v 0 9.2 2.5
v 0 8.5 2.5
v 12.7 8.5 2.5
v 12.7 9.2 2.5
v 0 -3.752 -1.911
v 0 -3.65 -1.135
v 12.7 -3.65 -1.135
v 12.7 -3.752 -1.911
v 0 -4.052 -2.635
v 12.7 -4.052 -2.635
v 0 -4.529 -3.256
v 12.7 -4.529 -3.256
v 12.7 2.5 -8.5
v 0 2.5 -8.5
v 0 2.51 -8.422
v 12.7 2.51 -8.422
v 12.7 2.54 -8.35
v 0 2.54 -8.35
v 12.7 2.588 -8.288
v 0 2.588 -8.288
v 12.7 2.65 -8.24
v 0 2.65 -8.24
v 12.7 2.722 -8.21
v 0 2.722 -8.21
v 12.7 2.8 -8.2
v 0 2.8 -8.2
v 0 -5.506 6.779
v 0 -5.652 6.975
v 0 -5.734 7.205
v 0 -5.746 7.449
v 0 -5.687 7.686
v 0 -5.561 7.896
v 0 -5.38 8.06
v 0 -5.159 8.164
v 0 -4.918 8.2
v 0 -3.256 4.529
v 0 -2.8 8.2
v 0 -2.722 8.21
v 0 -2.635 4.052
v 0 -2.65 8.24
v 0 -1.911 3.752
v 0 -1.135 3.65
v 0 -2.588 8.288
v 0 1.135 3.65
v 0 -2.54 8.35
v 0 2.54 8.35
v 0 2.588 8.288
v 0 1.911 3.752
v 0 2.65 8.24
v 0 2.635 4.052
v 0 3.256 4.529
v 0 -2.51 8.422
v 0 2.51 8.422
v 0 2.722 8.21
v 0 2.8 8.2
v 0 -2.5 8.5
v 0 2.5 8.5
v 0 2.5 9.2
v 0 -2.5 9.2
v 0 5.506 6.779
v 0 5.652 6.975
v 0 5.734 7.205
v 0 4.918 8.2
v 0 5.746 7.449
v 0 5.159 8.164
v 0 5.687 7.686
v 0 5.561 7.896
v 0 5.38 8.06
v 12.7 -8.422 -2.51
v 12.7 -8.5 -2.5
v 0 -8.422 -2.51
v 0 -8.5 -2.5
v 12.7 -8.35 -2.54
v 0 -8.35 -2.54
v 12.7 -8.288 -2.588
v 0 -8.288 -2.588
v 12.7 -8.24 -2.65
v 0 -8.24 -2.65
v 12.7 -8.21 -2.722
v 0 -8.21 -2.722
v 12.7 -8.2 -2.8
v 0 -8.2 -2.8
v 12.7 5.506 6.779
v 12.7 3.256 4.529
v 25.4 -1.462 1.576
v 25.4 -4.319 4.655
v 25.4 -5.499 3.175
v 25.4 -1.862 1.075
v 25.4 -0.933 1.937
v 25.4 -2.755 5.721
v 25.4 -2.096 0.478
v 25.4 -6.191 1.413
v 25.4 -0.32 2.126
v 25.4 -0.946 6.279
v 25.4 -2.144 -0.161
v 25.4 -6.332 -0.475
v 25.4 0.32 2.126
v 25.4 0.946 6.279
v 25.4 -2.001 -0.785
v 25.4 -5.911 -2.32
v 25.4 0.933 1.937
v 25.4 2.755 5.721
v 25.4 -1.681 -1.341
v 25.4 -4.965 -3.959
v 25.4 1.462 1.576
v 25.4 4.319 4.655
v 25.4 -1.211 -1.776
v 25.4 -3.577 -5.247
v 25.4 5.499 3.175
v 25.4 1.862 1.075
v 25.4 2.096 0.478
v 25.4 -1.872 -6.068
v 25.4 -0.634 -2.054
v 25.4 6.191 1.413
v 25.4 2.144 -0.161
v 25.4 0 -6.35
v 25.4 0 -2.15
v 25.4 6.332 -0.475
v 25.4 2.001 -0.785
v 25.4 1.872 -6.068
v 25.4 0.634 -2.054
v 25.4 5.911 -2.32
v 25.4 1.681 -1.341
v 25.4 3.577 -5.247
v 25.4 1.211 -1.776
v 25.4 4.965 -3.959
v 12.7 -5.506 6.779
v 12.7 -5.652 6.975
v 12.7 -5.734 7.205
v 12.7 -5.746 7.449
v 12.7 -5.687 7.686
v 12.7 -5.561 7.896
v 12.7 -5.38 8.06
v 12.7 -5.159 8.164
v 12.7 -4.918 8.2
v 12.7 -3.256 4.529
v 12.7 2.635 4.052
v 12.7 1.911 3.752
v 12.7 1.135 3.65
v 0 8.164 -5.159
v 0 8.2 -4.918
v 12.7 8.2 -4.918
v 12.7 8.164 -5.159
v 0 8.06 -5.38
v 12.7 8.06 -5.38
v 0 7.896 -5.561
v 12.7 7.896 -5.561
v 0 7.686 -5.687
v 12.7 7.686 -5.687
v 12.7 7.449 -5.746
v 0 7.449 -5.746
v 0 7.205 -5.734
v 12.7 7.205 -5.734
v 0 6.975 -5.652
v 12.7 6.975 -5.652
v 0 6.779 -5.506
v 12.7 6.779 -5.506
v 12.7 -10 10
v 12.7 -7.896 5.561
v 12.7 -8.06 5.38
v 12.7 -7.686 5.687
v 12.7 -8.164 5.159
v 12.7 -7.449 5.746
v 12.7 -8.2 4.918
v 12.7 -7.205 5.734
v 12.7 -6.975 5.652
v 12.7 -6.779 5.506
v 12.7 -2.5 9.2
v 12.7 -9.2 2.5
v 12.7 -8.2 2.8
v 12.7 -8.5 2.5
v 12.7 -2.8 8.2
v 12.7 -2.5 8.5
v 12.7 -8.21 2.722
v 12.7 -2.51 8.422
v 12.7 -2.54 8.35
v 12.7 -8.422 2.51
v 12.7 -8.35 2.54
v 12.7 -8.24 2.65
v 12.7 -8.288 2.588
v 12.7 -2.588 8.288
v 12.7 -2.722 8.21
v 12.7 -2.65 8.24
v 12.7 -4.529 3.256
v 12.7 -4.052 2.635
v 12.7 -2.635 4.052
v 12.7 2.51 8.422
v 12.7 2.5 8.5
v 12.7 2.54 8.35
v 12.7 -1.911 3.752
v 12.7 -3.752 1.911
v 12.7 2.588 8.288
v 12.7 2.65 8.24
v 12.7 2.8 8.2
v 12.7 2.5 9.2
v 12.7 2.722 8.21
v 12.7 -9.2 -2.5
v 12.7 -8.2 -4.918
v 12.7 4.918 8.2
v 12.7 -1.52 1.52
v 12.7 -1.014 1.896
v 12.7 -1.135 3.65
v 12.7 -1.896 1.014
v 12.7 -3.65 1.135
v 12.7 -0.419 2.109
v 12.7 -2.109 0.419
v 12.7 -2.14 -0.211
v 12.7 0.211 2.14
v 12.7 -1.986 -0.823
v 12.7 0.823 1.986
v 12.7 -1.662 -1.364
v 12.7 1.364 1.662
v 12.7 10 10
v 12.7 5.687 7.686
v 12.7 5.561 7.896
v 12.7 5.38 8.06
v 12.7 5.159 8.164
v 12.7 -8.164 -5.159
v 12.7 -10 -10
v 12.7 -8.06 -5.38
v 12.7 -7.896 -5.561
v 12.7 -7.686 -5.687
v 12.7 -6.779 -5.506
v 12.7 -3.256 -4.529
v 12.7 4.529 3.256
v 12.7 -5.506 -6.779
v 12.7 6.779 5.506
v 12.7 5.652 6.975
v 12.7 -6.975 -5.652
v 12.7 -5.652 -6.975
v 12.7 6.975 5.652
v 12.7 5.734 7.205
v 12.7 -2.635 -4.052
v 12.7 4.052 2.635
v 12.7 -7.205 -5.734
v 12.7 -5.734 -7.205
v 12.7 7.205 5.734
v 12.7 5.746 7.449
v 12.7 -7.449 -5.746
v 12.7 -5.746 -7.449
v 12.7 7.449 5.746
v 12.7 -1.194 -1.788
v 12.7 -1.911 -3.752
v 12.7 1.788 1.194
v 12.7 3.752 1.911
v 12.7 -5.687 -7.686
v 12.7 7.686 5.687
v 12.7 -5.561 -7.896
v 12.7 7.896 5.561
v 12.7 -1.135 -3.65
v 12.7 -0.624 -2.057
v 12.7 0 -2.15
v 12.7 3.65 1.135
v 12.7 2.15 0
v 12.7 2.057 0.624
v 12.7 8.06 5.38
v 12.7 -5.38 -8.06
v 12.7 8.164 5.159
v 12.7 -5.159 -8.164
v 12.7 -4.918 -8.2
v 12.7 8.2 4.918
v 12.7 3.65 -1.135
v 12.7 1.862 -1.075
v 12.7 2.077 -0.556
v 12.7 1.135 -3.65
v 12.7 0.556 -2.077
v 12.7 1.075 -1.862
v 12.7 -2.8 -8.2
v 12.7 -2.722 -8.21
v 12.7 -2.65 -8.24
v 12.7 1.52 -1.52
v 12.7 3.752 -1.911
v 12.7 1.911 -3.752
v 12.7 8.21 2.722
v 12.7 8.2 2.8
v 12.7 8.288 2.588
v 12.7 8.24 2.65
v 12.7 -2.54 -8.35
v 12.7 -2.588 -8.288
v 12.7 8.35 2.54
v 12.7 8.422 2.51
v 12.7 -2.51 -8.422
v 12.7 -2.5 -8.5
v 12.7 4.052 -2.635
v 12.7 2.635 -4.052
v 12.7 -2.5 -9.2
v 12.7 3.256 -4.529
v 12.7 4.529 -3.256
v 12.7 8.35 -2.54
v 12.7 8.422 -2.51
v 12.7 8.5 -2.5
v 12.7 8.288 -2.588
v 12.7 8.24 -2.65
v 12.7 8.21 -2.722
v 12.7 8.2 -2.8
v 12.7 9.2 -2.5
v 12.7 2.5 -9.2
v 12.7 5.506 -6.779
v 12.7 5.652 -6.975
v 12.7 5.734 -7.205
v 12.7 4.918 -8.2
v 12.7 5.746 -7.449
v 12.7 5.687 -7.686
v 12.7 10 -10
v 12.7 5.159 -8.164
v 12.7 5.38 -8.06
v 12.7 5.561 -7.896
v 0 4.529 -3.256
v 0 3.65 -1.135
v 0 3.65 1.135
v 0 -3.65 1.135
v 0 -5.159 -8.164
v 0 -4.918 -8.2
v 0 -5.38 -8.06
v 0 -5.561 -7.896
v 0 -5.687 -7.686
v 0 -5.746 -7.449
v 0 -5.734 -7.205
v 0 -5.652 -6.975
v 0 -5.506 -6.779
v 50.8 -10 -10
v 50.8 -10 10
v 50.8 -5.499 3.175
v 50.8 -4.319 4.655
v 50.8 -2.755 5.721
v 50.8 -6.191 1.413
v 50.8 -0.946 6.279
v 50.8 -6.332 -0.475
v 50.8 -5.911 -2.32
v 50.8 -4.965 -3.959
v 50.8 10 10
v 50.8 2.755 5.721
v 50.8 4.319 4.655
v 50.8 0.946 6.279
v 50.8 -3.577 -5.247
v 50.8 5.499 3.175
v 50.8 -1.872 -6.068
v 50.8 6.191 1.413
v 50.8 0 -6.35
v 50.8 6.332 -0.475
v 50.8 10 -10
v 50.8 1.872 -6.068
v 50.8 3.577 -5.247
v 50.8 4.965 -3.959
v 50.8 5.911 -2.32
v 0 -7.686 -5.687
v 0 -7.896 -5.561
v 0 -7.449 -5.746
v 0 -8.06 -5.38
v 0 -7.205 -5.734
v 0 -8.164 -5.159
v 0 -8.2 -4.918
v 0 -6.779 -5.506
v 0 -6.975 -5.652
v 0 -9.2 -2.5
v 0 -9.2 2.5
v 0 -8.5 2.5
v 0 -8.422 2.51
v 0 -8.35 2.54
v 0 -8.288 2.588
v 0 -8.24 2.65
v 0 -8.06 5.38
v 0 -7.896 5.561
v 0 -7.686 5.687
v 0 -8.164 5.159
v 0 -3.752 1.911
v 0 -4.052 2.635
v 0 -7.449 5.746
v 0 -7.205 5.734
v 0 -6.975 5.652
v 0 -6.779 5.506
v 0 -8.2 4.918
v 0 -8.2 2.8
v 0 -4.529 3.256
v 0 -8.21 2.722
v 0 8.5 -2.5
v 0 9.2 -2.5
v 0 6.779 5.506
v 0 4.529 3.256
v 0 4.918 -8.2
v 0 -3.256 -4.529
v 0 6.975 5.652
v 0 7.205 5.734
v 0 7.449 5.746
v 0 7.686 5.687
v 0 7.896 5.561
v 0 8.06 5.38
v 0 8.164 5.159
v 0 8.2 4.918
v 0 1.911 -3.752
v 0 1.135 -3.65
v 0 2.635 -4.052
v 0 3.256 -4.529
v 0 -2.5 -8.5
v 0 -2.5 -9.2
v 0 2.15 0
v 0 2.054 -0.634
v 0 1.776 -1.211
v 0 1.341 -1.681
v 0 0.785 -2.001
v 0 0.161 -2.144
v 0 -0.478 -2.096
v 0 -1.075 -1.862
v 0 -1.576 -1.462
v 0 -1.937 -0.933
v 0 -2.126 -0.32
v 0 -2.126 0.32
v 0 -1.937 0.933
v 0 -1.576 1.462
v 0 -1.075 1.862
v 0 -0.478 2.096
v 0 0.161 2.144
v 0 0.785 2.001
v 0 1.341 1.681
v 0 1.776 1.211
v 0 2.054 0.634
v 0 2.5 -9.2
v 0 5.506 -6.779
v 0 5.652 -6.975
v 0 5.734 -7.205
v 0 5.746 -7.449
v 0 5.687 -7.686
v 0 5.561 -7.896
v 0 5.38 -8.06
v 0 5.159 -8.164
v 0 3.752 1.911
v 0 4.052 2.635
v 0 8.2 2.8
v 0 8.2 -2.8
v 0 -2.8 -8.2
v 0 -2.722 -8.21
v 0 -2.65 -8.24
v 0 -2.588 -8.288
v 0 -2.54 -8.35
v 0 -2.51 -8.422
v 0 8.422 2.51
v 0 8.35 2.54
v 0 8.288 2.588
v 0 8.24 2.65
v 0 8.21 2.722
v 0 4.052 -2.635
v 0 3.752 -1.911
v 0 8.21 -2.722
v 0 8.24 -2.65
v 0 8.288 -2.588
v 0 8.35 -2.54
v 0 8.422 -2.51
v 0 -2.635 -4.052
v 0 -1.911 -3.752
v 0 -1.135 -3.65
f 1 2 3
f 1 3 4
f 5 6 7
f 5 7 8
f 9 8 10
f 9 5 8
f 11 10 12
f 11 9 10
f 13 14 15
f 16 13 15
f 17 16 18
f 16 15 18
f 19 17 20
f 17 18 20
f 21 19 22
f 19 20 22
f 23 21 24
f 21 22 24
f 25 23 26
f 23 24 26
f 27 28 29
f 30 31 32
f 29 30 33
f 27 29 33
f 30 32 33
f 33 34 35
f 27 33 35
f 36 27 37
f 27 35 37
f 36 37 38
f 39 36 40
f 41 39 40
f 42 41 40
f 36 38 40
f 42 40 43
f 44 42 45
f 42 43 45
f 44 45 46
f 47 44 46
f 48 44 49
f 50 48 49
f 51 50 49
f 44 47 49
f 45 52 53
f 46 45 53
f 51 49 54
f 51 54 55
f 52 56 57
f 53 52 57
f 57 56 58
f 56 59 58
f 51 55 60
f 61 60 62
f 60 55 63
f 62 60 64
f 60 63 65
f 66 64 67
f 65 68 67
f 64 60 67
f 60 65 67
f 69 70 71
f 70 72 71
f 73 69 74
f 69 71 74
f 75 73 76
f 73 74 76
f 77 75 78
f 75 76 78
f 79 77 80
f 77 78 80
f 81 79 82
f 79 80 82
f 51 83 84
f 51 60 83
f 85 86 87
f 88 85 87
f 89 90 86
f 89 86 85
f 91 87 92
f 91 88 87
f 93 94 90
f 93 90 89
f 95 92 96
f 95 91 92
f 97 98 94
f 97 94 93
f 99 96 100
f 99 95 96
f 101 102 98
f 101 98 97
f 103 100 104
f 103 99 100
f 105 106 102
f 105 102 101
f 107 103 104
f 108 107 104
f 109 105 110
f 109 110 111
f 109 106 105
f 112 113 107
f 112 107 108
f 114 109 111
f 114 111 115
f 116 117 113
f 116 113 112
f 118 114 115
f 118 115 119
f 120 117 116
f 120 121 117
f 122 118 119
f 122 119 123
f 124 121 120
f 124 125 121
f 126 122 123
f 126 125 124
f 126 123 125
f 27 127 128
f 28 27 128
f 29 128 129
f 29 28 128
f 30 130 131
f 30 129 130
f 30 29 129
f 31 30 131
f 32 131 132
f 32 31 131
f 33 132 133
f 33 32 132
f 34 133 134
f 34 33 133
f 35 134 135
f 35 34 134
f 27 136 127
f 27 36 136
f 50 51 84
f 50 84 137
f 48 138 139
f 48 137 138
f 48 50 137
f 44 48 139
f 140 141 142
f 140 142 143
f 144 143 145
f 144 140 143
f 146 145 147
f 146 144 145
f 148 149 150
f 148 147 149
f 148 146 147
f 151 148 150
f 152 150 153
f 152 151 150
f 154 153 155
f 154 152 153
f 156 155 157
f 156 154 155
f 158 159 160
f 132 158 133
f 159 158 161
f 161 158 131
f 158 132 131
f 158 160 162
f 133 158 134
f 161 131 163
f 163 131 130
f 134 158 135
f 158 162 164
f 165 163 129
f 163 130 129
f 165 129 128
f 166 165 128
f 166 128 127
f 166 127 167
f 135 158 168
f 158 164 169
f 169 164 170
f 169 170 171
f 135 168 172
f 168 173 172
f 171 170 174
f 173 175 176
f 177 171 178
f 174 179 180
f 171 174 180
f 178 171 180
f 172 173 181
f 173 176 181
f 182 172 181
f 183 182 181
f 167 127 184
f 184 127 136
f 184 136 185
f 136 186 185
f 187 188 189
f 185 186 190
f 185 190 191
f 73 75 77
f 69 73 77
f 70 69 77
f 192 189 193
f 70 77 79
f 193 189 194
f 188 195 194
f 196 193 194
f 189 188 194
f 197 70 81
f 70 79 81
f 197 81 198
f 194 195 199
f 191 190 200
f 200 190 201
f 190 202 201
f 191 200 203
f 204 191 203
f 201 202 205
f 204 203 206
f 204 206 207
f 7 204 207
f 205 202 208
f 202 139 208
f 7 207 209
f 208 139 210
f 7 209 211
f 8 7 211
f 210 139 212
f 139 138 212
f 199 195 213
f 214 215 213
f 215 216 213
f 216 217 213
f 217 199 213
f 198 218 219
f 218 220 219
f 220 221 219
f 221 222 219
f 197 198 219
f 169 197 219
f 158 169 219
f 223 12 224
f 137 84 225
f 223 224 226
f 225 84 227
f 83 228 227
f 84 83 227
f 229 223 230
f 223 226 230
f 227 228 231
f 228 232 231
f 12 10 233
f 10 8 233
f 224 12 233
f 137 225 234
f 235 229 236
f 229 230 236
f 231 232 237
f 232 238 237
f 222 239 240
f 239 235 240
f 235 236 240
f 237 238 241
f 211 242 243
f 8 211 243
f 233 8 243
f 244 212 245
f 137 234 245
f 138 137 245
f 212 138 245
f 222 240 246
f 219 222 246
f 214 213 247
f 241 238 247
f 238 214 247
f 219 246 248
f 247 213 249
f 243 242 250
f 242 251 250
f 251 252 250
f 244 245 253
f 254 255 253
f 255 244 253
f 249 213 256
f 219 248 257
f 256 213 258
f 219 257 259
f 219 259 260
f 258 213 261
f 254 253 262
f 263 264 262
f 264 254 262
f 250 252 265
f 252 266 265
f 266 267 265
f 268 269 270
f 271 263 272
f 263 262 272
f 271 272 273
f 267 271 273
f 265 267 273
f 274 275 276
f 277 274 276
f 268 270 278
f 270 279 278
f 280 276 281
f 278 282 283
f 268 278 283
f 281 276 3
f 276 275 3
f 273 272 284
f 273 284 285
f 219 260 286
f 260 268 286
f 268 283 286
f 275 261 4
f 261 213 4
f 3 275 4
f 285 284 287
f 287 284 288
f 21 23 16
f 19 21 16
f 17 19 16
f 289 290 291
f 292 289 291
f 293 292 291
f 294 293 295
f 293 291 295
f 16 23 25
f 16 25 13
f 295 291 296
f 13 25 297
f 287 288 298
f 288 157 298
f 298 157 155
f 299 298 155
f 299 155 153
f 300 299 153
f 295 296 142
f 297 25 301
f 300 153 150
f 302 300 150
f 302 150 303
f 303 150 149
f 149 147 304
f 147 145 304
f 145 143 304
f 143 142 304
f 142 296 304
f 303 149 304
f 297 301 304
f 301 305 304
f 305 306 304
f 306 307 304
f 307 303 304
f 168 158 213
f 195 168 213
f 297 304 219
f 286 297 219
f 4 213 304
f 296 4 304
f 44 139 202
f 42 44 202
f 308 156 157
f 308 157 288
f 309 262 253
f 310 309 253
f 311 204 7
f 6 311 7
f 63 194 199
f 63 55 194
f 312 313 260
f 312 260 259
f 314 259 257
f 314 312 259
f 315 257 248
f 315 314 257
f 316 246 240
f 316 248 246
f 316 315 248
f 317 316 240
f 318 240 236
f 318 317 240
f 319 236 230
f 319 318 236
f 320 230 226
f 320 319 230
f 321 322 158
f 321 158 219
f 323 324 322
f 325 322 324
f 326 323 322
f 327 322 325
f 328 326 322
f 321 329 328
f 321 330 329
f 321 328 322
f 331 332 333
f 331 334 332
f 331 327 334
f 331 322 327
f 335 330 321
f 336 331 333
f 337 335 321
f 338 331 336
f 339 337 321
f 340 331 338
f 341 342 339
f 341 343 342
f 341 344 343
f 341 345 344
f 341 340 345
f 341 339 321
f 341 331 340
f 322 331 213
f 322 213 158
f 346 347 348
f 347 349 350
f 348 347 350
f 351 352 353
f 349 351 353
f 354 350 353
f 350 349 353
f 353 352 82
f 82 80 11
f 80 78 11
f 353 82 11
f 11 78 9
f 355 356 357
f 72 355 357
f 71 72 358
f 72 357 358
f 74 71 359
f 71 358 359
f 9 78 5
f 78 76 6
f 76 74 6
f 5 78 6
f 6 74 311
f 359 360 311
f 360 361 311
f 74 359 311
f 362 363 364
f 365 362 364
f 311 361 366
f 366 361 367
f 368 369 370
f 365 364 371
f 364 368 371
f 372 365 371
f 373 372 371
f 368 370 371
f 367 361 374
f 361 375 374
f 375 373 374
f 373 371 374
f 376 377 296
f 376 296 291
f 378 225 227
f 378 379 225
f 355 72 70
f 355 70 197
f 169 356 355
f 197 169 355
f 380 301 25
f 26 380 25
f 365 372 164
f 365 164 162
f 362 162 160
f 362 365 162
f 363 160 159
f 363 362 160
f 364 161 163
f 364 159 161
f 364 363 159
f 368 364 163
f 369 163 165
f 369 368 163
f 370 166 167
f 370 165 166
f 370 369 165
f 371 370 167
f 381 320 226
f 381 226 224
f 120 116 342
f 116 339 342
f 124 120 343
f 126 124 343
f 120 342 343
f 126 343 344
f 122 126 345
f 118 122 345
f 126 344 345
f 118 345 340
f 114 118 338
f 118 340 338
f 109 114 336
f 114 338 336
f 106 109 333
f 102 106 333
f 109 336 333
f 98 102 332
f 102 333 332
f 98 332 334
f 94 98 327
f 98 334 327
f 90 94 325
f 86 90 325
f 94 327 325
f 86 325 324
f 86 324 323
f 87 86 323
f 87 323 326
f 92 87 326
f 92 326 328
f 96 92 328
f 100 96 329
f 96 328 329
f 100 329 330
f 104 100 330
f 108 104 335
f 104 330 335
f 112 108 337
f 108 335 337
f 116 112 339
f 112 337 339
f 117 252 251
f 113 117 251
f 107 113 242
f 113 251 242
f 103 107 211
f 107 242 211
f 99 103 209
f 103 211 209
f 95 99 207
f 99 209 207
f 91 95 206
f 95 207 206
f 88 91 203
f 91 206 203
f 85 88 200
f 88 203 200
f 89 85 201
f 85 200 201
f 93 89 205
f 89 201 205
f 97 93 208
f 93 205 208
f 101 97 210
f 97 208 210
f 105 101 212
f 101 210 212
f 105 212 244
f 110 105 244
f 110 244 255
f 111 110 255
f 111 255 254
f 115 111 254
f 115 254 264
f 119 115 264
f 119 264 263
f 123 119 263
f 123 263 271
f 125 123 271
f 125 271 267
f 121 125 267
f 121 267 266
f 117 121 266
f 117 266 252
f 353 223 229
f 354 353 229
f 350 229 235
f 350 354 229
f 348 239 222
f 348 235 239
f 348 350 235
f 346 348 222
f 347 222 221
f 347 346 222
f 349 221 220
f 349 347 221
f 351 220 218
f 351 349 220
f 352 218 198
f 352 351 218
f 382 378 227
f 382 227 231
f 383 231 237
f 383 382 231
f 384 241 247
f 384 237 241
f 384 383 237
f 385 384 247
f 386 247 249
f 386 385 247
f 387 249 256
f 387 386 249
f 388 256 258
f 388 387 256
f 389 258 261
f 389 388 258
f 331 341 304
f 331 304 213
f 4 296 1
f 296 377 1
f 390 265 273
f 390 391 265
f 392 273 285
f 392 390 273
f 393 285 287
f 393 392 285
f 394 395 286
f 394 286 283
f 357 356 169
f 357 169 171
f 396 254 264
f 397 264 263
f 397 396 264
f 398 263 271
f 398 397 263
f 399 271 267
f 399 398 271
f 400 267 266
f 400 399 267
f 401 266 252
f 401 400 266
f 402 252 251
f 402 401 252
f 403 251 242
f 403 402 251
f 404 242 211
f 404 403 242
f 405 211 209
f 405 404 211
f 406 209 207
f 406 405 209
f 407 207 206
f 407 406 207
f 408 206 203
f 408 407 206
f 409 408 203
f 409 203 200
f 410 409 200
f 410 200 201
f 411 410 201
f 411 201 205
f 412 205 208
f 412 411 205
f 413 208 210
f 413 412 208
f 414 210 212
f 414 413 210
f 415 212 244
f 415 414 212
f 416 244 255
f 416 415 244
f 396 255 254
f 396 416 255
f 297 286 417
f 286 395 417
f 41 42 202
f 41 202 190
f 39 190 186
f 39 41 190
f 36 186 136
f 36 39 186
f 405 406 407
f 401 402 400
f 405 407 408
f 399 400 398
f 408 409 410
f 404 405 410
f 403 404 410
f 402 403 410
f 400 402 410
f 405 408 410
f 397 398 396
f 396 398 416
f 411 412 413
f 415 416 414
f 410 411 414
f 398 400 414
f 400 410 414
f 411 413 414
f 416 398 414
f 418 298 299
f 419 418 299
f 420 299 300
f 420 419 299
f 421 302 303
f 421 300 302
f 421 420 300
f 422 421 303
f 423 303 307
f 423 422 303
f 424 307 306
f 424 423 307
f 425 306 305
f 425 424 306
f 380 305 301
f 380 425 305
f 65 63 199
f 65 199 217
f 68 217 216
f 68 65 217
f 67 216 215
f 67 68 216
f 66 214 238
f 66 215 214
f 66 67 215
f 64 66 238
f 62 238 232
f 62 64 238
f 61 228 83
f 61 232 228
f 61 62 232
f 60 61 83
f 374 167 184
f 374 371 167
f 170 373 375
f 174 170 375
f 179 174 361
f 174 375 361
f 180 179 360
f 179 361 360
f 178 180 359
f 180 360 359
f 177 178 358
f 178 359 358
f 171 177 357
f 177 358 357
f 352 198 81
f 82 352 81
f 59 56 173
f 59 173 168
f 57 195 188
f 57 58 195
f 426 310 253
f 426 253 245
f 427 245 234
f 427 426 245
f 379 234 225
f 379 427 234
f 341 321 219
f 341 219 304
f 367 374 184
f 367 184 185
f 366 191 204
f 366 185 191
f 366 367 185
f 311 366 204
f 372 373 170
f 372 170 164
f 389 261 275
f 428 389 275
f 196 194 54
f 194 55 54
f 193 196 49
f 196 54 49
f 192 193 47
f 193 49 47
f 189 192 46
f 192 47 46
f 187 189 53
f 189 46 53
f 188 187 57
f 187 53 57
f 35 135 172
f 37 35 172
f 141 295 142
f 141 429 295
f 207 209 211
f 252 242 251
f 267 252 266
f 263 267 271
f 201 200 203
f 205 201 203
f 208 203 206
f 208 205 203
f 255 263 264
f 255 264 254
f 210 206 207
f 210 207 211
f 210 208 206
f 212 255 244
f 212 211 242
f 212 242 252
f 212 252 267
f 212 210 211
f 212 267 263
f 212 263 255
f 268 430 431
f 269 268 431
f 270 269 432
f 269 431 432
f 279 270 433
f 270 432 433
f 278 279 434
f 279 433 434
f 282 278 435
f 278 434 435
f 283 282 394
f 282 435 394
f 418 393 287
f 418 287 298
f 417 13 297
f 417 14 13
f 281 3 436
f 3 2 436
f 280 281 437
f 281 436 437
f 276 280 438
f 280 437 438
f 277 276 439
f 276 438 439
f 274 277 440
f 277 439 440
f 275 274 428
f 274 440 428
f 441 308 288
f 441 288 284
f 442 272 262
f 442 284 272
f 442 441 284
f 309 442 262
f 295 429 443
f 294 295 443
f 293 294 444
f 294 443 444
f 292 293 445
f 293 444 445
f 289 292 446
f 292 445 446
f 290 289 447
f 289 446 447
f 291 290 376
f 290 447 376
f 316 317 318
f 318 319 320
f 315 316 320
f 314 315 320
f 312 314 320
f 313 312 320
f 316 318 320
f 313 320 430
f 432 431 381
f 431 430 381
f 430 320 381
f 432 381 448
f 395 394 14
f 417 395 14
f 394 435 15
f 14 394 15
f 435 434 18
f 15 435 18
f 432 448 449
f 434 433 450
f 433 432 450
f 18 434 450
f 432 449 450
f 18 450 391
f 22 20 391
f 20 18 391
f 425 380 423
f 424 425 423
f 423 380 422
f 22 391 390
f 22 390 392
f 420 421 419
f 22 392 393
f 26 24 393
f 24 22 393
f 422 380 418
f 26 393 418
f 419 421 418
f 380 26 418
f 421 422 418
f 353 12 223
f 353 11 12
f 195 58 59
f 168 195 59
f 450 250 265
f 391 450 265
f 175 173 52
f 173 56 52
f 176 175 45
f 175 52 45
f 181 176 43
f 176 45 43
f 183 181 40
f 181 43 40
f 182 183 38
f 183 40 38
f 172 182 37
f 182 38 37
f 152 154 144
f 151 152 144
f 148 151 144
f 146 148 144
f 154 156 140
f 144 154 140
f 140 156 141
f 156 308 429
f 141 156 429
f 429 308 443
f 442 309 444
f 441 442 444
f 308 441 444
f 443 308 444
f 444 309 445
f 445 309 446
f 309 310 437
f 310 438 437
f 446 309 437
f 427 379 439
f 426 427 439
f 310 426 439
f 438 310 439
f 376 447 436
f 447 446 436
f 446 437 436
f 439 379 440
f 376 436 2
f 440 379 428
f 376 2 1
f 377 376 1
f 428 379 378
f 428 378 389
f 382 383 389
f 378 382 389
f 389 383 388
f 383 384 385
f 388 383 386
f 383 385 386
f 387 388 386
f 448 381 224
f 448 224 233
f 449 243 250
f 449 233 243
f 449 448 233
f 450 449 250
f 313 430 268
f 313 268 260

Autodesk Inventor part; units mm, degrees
ref_plane "YZ Plane" through (0, 0, 0) normal (1, 0, 0) x (0, 1, 0)
ref_plane "XZ Plane" through (0, 0, 0) normal (0, 1, 0) x (-1, 0, 0)
ref_plane "XY Plane" through (0, 0, 0) normal (0, 0, 1) x (1, 0, 0)
sketch "Sketch1" plane through (0, 0, 0) normal (1, 0, 0) x (0, 1, 0)
  arc A0 (3.3, 10) -> (2.5, 9.2) centre (3.3, 9.2) ccw
  line L0 (2.5, 9.2) -> (2.5, 8.5)
  arc A1 (2.5, 8.5) -> (2.8, 8.2) centre (2.8, 8.5) ccw
  line L1 (2.8, 8.2) -> (4.9176, 8.2)
  arc A2 (5.5062, 6.779) -> (4.9176, 8.2) centre (4.9176, 7.3676) ccw
  line L2 (5.5062, 6.779) -> (3.2559, 4.5287)
  arc A3 (1.1346, 3.65) -> (3.2559, 4.5287) centre (1.1346, 6.65) ccw
  line L3 (1.1346, 3.65) -> (-1.1346, 3.65)
  arc A4 (-3.2559, 4.5287) -> (-1.1346, 3.65) centre (-1.1346, 6.65) ccw
  line L4 (-3.2559, 4.5287) -> (-5.5062, 6.779)
  arc A5 (-4.9176, 8.2) -> (-5.5062, 6.779) centre (-4.9176, 7.3676) ccw
  line L5 (-4.9176, 8.2) -> (-2.8, 8.2)
  arc A6 (-2.8, 8.2) -> (-2.5, 8.5) centre (-2.8, 8.5) ccw
  line L6 (-2.5, 8.5) -> (-2.5, 9.2)
  arc A7 (-2.5, 9.2) -> (-3.3, 10) centre (-3.3, 9.2) ccw
  line L7 (-8, 10) -> (-3.3, 10)
  arc A8 (-8, 10) -> (-10, 8) centre (-8, 8) ccw
  line L8 (-10, -3.3) -> (-10, 8)
  arc A9 (-10, 3.3) -> (-9.2, 2.5) centre (-9.2, 3.3) ccw
  line L9 (-9.2, 2.5) -> (-8.5, 2.5)
  arc A10 (-8.5, 2.5) -> (-8.2, 2.8) centre (-8.5, 2.8) ccw
  line L10 (-8.2, 2.8) -> (-8.2, 4.9176)
  arc A11 (-6.779, 5.5062) -> (-8.2, 4.9176) centre (-7.3676, 4.9176) ccw
  line L11 (-6.779, 5.5062) -> (-4.5287, 3.2559)
  arc A12 (-3.65, 1.1346) -> (-4.5287, 3.2559) centre (-6.65, 1.1346) ccw
  line L12 (-3.65, 1.1346) -> (-3.65, -1.1346)
  arc A13 (-4.5287, -3.2559) -> (-3.65, -1.1346) centre (-6.65, -1.1346) ccw
  line L13 (-4.5287, -3.2559) -> (-6.779, -5.5062)
  arc A14 (-8.2, -4.9176) -> (-6.779, -5.5062) centre (-7.3676, -4.9176) ccw
  line L14 (-8.2, -4.9176) -> (-8.2, -2.8)
  arc A15 (-8.2, -2.8) -> (-8.5, -2.5) centre (-8.5, -2.8) ccw
  line L15 (-8.5, -2.5) -> (-9.2, -2.5)
  arc A16 (-9.2, -2.5) -> (-10, -3.3) centre (-9.2, -3.3) ccw
  line L16 (-10, -8) -> (-10, -3.3)
  arc A17 (-10, -8) -> (-8, -10) centre (-8, -8) ccw
  line L17 (3.3, -10) -> (-8, -10)
  arc A18 (-3.3, -10) -> (-2.5, -9.2) centre (-3.3, -9.2) ccw
  line L18 (-2.5, -9.2) -> (-2.5, -8.5)
  arc A19 (-2.5, -8.5) -> (-2.8, -8.2) centre (-2.8, -8.5) ccw
  line L19 (-2.8, -8.2) -> (-4.9176, -8.2)
  arc A20 (-5.5062, -6.779) -> (-4.9176, -8.2) centre (-4.9176, -7.3676) ccw
  line L20 (-5.5062, -6.779) -> (-3.2559, -4.5287)
  arc A21 (-1.1346, -3.65) -> (-3.2559, -4.5287) centre (-1.1346, -6.65) ccw
  line L21 (-1.1346, -3.65) -> (1.1346, -3.65)
  arc A22 (3.2559, -4.5287) -> (1.1346, -3.65) centre (1.1346, -6.65) ccw
  line L22 (3.2559, -4.5287) -> (5.5062, -6.779)
  arc A23 (4.9176, -8.2) -> (5.5062, -6.779) centre (4.9176, -7.3676) ccw
  line L23 (4.9176, -8.2) -> (2.8, -8.2)
  arc A24 (2.8, -8.2) -> (2.5, -8.5) centre (2.8, -8.5) ccw
  line L24 (2.5, -8.5) -> (2.5, -9.2)
  arc A25 (2.5, -9.2) -> (3.3, -10) centre (3.3, -9.2) ccw
  line L25 (8, -10) -> (3.3, -10)
  arc A26 (8, -10) -> (10, -8) centre (8, -8) ccw
  line L26 (10, 3.3) -> (10, -8)
  arc A27 (10, -3.3) -> (9.2, -2.5) centre (9.2, -3.3) ccw
  line L27 (9.2, -2.5) -> (8.5, -2.5)
  arc A28 (8.5, -2.5) -> (8.2, -2.8) centre (8.5, -2.8) ccw
  line L28 (8.2, -2.8) -> (8.2, -4.9176)
  arc A29 (6.779, -5.5062) -> (8.2, -4.9176) centre (7.3676, -4.9176) ccw
  line L29 (6.779, -5.5062) -> (4.5287, -3.2559)
  arc A30 (3.65, -1.1346) -> (4.5287, -3.2559) centre (6.65, -1.1346) ccw
  line L30 (3.65, -1.1346) -> (3.65, 1.1346)
  arc A31 (4.5287, 3.2559) -> (3.65, 1.1346) centre (6.65, 1.1346) ccw
  line L31 (4.5287, 3.2559) -> (6.779, 5.5062)
  arc A32 (8.2, 4.9176) -> (6.779, 5.5062) centre (7.3676, 4.9176) ccw
  line L32 (8.2, 4.9176) -> (8.2, 2.8)
  arc A33 (8.2, 2.8) -> (8.5, 2.5) centre (8.5, 2.8) ccw
  line L33 (8.5, 2.5) -> (9.2, 2.5)
  arc A34 (9.2, 2.5) -> (10, 3.3) centre (9.2, 3.3) ccw
  line L34 (10, 8) -> (10, 3.3)
  arc A35 (10, 8) -> (8, 10) centre (8, 8) ccw
  line L35 (-3.3, 10) -> (8, 10)
  circle A36 centre (0, 0) radius 2.15
  line L36 (2.5, 9.2) -> (-2.5, 9.2)
  line L37 (-9.2, 2.5) -> (-9.2, -2.5)
  line L38 (-2.5, -9.2) -> (2.5, -9.2)
  line L39 (9.2, -2.5) -> (9.2, 2.5)
  point P0 (0, 0)
  point P1 (0, 0)
  point P2 (-9.2, 2.5)
  point P3 (-1.2, -12.5)
  point P4 (-2.5, -9.2)
  point P5 (10.5, -19.2)
  point P6 (17.2, -12.5)
  point P7 (9.2, 2.5)
  point P8 (9.2, -2.5)
  dimension "d2" = 360
extrude "Extrusion1" add sketch "Sketch1" along normal blind 12.7 contours L0 A1 L1 A2 L2 A3 L3 A4 L4 A5 L5 A6 L6 L36 | L39 L27 A28 L28 A29 L29 A30 L30 A31 L31 A32 L32 A33 L33 | L9 A10 L10 A11 L11 A12 L12 A13 L13 A14 L14 A15 L15 L37 | L38 L18 A19 L19 A20 L20 A21 L21 A22 L22 A23 L23 A24 L24 | A36
sketch "Sketch2" plane through (12.7, 0, 0) normal (1, 0, 0) x (0, 0, -1)
  circle A0 centre (0, 0) radius 2.15 projected
  line L0 (-10, -10) -> (10, -10)
  line L1 (10, -10) -> (10, 10)
  line L2 (10, 10) -> (-10, 10)
  line L3 (-10, 10) -> (-10, -10)
  line L4 (-10, -10) -> (10, 10) construction
  line L5 (10, -10) -> (-10, 10) construction
  point P0 (0, 0)
  dimension "d6" = 20
  dimension "d7" = 20
extrude "Extrusion2" add sketch "Sketch2" along normal blind 38.1
sketch "Sketch3" plane through (50.8, 0, 0) normal (1, 0, 0) x (0, 0, -1)
  circle A0 centre (0, 0) radius 6.35
  dimension "d10" = 12.7
extrude "Extrusion3" cut sketch "Sketch3" against normal blind 25.4
thread "Thread1" size "1/2-13 UNC" class "2B" standard "ANSI Unified Screw Threads" full length
properties part number "Line 5 Adapter" material "Aluminum 6061"
